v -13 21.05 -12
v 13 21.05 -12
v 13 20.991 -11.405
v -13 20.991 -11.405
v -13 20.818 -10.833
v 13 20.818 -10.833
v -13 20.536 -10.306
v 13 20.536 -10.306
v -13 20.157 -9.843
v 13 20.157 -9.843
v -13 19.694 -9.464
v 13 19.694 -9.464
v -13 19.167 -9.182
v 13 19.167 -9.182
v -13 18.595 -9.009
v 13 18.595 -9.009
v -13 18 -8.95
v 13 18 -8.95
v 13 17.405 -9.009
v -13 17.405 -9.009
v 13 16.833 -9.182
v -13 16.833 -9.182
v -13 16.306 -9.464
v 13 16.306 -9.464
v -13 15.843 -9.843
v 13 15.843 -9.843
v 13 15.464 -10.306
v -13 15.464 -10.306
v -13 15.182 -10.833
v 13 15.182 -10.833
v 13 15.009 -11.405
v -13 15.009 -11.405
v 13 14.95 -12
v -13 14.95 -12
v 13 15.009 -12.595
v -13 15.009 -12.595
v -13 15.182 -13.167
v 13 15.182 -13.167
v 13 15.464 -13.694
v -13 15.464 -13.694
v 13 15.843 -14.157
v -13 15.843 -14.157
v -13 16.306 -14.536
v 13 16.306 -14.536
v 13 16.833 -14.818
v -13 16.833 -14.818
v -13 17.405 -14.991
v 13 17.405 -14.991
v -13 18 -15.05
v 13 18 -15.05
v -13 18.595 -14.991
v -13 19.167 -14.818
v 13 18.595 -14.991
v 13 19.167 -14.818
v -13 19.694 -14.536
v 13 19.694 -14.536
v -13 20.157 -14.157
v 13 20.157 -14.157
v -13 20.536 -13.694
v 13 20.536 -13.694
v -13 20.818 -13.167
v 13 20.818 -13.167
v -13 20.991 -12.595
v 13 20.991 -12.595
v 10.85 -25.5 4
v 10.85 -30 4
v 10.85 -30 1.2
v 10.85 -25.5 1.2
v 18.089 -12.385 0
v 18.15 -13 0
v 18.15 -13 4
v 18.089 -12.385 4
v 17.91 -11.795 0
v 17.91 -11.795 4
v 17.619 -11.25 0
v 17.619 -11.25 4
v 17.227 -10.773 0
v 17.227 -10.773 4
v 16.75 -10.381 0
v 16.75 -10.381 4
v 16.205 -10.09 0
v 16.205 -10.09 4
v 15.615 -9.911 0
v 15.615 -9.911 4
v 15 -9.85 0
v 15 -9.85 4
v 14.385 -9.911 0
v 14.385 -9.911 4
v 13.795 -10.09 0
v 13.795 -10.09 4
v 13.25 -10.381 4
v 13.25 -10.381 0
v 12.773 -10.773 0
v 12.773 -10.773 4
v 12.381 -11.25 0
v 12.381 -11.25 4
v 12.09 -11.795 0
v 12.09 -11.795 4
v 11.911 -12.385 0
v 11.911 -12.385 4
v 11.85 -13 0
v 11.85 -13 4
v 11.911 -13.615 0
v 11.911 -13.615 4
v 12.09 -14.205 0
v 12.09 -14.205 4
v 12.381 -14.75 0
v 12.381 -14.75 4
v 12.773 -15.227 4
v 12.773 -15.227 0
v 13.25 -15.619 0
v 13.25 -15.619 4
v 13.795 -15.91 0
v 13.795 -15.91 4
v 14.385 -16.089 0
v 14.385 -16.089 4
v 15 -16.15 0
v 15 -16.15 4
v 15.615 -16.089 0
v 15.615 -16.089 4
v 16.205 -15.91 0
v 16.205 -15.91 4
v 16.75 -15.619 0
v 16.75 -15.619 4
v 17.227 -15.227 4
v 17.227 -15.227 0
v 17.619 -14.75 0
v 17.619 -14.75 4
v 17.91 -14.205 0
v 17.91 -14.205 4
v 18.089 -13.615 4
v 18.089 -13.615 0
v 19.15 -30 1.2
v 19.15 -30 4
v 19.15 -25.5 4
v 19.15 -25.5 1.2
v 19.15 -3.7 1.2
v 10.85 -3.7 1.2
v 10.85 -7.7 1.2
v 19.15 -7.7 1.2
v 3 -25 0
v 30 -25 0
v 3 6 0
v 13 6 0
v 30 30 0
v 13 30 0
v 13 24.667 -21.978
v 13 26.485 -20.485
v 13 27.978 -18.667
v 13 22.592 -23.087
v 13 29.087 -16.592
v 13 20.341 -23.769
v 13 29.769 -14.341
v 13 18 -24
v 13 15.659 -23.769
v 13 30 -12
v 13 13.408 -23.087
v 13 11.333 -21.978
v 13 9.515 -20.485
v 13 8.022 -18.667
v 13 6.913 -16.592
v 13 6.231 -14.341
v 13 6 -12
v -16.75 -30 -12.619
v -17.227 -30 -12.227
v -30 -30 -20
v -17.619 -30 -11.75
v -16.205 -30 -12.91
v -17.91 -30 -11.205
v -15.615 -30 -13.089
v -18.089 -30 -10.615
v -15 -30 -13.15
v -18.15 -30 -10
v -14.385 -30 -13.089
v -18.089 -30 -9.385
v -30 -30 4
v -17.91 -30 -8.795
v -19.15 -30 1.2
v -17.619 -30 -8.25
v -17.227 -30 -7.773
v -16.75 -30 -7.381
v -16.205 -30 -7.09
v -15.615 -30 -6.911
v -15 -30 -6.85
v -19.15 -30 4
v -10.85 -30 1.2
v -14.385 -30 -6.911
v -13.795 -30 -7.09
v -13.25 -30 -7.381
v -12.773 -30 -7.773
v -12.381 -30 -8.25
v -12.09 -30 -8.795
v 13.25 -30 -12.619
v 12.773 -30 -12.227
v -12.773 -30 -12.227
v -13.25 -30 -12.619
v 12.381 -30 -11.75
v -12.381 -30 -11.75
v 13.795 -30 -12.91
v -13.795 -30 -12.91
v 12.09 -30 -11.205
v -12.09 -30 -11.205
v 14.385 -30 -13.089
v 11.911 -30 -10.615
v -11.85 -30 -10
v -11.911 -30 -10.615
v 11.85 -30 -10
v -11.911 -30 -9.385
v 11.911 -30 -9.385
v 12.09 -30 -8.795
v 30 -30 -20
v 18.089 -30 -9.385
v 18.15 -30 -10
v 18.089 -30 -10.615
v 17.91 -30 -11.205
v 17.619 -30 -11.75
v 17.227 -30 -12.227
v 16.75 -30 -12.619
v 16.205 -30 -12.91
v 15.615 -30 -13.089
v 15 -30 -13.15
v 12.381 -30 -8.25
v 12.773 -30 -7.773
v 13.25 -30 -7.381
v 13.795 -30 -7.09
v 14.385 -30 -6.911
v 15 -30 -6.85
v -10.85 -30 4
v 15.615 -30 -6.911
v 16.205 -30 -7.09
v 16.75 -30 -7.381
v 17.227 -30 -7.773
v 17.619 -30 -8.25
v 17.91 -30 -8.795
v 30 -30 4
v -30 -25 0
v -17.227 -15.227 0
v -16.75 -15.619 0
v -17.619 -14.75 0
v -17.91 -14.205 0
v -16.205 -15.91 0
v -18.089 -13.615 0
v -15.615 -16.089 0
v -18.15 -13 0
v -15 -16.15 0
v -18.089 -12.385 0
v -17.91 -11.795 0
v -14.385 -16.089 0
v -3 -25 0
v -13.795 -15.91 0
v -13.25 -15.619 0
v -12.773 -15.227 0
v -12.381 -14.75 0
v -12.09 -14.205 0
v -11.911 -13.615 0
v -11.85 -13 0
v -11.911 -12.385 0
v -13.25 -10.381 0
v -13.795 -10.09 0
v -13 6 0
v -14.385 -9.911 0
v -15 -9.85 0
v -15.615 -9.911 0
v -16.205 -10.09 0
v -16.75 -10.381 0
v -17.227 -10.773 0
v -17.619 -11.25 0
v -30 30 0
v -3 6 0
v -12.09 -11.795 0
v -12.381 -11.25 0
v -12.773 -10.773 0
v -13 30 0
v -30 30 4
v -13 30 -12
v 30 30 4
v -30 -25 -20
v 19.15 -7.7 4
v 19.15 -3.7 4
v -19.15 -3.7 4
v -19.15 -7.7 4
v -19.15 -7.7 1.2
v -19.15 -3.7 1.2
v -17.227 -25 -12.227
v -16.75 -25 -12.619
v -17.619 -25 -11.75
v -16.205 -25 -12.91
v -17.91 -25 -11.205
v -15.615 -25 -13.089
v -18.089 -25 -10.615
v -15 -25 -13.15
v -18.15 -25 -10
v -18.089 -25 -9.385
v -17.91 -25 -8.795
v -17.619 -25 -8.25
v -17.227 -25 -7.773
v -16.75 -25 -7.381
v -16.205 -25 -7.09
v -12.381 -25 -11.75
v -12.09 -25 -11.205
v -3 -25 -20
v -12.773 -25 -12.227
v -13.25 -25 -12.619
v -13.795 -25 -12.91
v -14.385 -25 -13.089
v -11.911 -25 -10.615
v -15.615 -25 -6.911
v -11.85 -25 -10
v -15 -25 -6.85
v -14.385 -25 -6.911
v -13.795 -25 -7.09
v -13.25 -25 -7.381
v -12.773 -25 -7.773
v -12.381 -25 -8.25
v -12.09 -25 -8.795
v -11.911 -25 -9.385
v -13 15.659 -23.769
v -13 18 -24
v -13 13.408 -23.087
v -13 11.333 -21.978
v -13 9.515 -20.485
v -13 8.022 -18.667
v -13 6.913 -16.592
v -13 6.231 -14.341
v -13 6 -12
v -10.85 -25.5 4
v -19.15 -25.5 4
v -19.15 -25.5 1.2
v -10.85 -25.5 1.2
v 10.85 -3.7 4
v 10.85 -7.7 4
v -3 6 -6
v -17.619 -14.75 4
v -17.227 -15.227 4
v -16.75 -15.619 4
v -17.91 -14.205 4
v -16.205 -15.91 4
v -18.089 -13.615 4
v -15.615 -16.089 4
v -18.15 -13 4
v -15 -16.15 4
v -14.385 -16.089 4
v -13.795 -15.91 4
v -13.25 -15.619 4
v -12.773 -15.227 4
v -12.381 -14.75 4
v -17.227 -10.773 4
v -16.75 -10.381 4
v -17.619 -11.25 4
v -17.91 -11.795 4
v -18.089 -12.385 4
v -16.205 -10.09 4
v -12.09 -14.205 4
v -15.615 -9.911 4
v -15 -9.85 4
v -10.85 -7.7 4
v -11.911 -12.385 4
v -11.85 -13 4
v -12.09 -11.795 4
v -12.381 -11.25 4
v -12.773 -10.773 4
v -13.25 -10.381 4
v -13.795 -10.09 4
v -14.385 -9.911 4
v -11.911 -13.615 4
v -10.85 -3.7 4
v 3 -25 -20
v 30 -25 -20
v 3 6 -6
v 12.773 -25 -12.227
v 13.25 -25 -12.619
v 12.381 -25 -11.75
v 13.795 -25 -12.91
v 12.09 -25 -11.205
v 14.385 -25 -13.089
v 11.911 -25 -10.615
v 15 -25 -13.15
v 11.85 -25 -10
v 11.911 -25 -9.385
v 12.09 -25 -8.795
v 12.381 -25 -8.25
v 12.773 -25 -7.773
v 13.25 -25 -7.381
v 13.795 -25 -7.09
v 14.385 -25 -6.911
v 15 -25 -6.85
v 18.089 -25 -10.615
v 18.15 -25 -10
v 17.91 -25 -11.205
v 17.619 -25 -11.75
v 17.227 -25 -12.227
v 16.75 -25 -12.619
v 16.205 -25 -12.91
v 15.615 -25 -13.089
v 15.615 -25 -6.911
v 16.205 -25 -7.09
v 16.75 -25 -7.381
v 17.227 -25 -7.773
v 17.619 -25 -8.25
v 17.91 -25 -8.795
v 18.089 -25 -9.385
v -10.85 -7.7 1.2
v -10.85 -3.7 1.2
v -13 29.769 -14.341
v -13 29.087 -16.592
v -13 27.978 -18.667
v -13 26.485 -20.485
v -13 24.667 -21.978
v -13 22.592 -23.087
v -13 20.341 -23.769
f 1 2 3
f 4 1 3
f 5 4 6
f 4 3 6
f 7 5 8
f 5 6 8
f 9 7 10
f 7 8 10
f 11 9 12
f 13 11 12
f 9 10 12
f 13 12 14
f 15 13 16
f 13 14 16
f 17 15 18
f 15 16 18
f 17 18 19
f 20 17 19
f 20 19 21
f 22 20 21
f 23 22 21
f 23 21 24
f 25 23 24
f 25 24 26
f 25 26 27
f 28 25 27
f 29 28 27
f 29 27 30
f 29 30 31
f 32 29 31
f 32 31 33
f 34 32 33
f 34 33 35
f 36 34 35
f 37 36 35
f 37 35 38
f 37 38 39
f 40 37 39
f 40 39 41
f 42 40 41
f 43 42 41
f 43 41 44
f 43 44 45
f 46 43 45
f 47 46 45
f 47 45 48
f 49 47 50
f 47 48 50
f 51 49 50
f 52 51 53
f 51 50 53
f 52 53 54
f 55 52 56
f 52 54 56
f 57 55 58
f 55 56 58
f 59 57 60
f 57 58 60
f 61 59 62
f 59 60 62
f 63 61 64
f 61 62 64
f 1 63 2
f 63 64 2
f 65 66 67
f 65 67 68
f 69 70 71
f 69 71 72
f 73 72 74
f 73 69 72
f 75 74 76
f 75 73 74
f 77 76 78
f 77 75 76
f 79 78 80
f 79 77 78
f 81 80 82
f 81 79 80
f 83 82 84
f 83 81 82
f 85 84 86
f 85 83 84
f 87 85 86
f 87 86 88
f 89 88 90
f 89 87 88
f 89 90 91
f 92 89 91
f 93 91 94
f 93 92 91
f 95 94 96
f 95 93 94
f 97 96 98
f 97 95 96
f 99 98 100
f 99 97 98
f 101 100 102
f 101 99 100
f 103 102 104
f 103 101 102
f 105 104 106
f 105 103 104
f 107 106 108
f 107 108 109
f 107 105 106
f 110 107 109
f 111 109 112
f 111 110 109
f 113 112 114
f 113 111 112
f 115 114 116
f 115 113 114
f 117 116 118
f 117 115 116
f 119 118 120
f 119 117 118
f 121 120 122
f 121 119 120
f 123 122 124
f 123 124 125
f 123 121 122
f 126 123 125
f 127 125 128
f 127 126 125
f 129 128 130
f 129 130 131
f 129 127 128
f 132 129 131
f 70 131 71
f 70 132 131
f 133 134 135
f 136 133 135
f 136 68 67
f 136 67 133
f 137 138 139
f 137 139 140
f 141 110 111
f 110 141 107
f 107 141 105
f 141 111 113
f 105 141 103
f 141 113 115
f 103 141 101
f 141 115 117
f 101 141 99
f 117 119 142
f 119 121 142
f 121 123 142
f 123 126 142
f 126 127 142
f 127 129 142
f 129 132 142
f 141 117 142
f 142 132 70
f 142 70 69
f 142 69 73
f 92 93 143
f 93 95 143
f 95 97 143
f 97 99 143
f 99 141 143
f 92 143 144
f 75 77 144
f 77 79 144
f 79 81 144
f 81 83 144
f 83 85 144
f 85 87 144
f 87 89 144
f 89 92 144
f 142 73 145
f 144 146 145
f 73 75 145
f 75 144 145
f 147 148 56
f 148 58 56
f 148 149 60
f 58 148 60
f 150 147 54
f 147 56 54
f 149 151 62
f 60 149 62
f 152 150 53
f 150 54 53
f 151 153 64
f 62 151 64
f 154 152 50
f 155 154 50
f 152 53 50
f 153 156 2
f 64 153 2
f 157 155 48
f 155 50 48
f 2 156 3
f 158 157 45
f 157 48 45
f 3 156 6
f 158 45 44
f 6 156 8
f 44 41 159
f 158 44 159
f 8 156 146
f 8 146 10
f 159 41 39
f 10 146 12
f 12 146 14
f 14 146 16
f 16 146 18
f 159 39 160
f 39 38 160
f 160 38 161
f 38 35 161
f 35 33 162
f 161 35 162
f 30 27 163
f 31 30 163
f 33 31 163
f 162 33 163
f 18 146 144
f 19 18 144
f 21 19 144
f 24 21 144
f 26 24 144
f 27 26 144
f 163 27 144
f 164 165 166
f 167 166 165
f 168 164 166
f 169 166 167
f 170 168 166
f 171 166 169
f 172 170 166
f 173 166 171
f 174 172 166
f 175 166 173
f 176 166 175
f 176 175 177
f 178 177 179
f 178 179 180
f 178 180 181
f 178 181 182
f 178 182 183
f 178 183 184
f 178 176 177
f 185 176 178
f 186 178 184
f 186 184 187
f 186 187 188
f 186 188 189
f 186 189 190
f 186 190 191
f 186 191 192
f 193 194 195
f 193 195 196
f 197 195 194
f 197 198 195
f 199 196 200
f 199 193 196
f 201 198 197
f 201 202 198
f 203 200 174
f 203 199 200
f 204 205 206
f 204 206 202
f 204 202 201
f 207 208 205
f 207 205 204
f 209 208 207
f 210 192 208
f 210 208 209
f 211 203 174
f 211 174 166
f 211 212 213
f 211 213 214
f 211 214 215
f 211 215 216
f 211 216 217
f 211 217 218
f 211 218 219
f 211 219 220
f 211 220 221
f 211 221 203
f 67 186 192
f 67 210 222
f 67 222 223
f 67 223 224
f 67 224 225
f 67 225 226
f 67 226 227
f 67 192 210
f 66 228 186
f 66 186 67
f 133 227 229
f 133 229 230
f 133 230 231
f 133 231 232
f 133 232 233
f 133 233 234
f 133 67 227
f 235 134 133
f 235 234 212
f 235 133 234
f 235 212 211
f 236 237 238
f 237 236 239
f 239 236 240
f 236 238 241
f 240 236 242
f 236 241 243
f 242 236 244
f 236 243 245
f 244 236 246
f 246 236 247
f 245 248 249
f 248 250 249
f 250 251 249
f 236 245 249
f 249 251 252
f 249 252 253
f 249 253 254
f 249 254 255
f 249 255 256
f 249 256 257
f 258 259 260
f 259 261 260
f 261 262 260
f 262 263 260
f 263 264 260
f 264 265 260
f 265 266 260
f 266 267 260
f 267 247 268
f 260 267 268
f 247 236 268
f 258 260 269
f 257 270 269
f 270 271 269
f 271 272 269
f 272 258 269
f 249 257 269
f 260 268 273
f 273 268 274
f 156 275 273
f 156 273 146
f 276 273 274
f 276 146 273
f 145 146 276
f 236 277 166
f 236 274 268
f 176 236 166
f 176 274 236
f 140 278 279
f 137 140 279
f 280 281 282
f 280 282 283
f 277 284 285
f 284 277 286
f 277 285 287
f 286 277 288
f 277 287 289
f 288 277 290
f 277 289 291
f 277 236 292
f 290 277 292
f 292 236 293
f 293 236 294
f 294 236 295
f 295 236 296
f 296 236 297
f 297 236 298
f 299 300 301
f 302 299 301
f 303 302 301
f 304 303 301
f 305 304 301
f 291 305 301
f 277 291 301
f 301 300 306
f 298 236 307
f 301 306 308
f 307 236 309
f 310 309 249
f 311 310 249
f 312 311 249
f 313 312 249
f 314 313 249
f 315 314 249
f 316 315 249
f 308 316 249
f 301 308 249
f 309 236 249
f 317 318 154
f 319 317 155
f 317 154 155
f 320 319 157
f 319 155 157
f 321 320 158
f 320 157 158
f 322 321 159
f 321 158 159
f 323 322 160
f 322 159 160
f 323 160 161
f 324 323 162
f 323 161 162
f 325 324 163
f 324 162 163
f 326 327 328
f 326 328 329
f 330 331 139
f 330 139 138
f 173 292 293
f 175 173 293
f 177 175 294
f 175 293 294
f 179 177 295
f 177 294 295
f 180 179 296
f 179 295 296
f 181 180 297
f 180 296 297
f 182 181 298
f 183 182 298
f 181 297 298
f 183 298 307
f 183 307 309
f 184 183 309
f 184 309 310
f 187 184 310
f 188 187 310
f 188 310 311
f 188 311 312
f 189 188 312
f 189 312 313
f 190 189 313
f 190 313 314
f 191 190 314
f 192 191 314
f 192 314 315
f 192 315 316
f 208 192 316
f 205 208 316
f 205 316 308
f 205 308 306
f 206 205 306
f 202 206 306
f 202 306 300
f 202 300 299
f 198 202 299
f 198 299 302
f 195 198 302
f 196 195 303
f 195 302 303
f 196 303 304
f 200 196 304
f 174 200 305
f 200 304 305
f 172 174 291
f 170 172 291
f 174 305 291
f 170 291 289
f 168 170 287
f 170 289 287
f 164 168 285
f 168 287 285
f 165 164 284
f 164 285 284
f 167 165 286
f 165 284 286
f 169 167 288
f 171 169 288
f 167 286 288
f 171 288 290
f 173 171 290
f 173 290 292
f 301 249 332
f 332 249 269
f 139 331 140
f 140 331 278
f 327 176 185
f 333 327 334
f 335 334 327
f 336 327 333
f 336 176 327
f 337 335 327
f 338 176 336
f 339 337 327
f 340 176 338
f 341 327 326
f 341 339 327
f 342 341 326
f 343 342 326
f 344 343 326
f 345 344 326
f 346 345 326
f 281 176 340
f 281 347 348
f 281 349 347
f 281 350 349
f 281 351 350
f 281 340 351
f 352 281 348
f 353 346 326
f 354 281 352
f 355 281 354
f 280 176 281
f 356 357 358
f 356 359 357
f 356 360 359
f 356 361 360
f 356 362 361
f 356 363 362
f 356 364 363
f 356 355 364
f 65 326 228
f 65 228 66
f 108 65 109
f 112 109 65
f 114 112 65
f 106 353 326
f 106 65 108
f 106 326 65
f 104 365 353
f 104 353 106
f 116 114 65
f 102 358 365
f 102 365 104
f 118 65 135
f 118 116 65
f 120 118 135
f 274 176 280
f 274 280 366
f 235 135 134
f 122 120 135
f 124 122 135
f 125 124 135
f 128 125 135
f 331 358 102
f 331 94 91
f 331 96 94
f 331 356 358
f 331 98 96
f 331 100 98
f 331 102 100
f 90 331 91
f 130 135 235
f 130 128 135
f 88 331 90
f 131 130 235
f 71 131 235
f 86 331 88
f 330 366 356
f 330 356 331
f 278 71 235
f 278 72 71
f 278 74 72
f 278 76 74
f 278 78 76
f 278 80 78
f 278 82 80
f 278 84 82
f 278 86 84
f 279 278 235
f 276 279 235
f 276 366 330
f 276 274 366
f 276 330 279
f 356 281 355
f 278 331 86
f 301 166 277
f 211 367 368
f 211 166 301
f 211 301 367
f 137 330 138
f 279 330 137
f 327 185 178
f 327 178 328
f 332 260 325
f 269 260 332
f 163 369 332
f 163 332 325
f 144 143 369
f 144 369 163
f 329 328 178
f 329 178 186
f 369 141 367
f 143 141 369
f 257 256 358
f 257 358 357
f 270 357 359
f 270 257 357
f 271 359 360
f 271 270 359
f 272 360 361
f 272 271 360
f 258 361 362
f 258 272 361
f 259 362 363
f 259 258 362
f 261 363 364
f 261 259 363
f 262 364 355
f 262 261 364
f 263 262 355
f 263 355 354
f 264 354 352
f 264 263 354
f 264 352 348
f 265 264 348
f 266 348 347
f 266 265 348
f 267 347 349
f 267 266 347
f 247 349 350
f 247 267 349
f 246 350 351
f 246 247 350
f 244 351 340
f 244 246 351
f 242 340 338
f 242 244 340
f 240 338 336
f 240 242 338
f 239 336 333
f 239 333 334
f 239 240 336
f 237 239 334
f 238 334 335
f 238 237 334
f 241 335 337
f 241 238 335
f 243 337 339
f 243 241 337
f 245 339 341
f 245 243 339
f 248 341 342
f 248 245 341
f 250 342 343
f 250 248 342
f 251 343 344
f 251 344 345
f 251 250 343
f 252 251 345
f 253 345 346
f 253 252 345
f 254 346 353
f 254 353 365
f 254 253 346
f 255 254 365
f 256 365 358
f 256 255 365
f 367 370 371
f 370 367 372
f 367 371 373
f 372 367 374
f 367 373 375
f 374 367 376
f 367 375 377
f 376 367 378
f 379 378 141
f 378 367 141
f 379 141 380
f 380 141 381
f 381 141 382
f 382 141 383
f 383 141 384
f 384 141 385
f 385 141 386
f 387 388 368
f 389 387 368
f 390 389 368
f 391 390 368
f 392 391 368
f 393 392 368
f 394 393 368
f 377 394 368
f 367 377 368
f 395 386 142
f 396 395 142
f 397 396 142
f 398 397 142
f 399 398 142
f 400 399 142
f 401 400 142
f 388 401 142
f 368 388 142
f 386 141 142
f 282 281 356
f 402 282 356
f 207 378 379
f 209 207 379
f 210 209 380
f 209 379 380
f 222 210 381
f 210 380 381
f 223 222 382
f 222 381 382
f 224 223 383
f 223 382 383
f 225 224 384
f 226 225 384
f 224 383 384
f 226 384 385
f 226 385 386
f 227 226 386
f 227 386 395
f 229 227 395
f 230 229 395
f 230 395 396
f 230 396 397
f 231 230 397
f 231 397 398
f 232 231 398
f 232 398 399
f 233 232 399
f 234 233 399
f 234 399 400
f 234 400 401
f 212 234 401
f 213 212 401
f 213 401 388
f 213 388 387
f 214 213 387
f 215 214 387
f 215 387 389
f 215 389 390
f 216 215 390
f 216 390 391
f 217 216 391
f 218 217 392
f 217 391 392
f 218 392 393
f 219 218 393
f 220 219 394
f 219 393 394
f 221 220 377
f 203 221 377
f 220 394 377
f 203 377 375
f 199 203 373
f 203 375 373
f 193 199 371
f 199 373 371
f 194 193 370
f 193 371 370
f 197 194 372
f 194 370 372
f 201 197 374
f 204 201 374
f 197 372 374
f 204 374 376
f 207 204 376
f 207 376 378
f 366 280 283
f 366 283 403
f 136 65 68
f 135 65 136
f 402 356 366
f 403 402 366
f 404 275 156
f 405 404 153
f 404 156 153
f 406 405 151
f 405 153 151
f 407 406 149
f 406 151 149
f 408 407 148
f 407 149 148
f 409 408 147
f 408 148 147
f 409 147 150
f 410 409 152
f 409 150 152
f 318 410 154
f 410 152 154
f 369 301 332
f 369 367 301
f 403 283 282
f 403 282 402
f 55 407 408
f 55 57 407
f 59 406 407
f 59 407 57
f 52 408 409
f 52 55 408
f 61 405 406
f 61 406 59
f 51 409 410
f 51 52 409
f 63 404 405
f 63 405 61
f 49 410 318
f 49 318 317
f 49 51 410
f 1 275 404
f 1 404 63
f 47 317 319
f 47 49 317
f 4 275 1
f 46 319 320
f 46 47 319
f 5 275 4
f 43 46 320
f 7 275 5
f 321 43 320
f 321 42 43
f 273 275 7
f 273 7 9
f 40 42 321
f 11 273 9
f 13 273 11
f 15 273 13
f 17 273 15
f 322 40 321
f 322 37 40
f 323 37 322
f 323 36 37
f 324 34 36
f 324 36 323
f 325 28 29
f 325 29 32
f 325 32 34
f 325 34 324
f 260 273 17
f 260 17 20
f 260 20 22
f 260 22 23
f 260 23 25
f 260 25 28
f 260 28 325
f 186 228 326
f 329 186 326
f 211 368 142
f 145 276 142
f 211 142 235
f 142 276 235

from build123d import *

# Parameters (mm, degrees)
F0_W           = 60
F0_H           = 60
F0_R           = 3.15
F1_DEPTH       = 4
F2_W           = 8.3
F2_H           = 4.5
F2_H_2         = 4
F3_DEPTH       = 2.8
F4_W           = 26
F4_H           = 24
F5_DEPTH       = 24
F6_R           = 3.05
F7_DEPTH       = 43.001
F8_W           = 60
F8_H           = 5
F9_DEPTH       = 20
F11_DEPTH      = 3
F11_DEPTH_BACK = 3
F12_R          = 3.15
F13_DEPTH      = 5.001


with BuildPart() as f1:
    # F0 (on Top) → F1 (new body)
    with BuildSketch(Plane.XY):
        Rectangle(F0_W, F0_H)
        with Locations((-15, -13)):
            Circle(F0_R, mode=Mode.SUBTRACT)
        with Locations((15, -13)):
            Circle(F0_R, mode=Mode.SUBTRACT)
    extrude(amount=F1_DEPTH)

    # F2 (on face) → F3 (cut)
    with BuildSketch(Plane.XY.offset(4)):
        with Locations((-15, -27.75)):
            Rectangle(F2_W, F2_H)
        with Locations((15, -27.75)):
            Rectangle(F2_W, F2_H)
        with Locations((-15, -5.7)):
            Rectangle(F2_W, F2_H_2)
        with Locations((15, -5.7)):
            Rectangle(F2_W, F2_H_2)
    extrude(amount=-F3_DEPTH, mode=Mode.SUBTRACT)

    # F4 (on face) → F5 (join)
    with BuildSketch(Plane(origin=(0, 0, 0), x_dir=(1, 0, 0), z_dir=(0, 0, -1))):
        with Locations((0, -18)):
            Rectangle(F4_W, F4_H)
    extrude(amount=F5_DEPTH)

    # F6 (on face) → F7 (cut, through all)
    with BuildSketch(Plane.YZ.offset(13)):
        with BuildLine():
            ThreePointArc((30, -12), (26.485281, -20.485281), (18, -24))
            Line((18, -24), (30, -24))
            Line((30, -24), (30, -12))
        make_face()
        with BuildLine():
            ThreePointArc((18, -24), (9.514719, -20.485281), (6, -12))
            Line((6, -12), (6, -24))
            Line((6, -24), (18, -24))
        make_face()
        with Locations((18, -12)):
            Circle(F6_R)
    extrude(amount=-F7_DEPTH, mode=Mode.SUBTRACT)

    # F8 (on face) → F9 (join)
    with BuildSketch(Plane(origin=(0, 0, 0), x_dir=(1, 0, 0), z_dir=(0, 0, -1))):
        with Locations((0, 27.5)):
            Rectangle(F8_W, F8_H)
    extrude(amount=F9_DEPTH)

    # F10 (on Right) → F11 (join, two sides)
    with BuildSketch(Plane.YZ) as f11_sk:
        Polygon((-25, 0), (-25, -20), (6, -6), (6, 0), align=None)
    extrude(amount=F11_DEPTH)
    extrude(f11_sk.sketch, amount=-F11_DEPTH_BACK)

    # F12 (on face) → F13 (cut, through all)
    with BuildSketch(Plane(origin=(0, -25, 0), x_dir=(-1, 0, 0), z_dir=(0, 1, 0))):
        with Locations((15, -10)):
            Circle(F12_R)
        with Locations((-15, -10)):
            Circle(F12_R)
    extrude(amount=-F13_DEPTH, mode=Mode.SUBTRACT)


solid = f1.part
